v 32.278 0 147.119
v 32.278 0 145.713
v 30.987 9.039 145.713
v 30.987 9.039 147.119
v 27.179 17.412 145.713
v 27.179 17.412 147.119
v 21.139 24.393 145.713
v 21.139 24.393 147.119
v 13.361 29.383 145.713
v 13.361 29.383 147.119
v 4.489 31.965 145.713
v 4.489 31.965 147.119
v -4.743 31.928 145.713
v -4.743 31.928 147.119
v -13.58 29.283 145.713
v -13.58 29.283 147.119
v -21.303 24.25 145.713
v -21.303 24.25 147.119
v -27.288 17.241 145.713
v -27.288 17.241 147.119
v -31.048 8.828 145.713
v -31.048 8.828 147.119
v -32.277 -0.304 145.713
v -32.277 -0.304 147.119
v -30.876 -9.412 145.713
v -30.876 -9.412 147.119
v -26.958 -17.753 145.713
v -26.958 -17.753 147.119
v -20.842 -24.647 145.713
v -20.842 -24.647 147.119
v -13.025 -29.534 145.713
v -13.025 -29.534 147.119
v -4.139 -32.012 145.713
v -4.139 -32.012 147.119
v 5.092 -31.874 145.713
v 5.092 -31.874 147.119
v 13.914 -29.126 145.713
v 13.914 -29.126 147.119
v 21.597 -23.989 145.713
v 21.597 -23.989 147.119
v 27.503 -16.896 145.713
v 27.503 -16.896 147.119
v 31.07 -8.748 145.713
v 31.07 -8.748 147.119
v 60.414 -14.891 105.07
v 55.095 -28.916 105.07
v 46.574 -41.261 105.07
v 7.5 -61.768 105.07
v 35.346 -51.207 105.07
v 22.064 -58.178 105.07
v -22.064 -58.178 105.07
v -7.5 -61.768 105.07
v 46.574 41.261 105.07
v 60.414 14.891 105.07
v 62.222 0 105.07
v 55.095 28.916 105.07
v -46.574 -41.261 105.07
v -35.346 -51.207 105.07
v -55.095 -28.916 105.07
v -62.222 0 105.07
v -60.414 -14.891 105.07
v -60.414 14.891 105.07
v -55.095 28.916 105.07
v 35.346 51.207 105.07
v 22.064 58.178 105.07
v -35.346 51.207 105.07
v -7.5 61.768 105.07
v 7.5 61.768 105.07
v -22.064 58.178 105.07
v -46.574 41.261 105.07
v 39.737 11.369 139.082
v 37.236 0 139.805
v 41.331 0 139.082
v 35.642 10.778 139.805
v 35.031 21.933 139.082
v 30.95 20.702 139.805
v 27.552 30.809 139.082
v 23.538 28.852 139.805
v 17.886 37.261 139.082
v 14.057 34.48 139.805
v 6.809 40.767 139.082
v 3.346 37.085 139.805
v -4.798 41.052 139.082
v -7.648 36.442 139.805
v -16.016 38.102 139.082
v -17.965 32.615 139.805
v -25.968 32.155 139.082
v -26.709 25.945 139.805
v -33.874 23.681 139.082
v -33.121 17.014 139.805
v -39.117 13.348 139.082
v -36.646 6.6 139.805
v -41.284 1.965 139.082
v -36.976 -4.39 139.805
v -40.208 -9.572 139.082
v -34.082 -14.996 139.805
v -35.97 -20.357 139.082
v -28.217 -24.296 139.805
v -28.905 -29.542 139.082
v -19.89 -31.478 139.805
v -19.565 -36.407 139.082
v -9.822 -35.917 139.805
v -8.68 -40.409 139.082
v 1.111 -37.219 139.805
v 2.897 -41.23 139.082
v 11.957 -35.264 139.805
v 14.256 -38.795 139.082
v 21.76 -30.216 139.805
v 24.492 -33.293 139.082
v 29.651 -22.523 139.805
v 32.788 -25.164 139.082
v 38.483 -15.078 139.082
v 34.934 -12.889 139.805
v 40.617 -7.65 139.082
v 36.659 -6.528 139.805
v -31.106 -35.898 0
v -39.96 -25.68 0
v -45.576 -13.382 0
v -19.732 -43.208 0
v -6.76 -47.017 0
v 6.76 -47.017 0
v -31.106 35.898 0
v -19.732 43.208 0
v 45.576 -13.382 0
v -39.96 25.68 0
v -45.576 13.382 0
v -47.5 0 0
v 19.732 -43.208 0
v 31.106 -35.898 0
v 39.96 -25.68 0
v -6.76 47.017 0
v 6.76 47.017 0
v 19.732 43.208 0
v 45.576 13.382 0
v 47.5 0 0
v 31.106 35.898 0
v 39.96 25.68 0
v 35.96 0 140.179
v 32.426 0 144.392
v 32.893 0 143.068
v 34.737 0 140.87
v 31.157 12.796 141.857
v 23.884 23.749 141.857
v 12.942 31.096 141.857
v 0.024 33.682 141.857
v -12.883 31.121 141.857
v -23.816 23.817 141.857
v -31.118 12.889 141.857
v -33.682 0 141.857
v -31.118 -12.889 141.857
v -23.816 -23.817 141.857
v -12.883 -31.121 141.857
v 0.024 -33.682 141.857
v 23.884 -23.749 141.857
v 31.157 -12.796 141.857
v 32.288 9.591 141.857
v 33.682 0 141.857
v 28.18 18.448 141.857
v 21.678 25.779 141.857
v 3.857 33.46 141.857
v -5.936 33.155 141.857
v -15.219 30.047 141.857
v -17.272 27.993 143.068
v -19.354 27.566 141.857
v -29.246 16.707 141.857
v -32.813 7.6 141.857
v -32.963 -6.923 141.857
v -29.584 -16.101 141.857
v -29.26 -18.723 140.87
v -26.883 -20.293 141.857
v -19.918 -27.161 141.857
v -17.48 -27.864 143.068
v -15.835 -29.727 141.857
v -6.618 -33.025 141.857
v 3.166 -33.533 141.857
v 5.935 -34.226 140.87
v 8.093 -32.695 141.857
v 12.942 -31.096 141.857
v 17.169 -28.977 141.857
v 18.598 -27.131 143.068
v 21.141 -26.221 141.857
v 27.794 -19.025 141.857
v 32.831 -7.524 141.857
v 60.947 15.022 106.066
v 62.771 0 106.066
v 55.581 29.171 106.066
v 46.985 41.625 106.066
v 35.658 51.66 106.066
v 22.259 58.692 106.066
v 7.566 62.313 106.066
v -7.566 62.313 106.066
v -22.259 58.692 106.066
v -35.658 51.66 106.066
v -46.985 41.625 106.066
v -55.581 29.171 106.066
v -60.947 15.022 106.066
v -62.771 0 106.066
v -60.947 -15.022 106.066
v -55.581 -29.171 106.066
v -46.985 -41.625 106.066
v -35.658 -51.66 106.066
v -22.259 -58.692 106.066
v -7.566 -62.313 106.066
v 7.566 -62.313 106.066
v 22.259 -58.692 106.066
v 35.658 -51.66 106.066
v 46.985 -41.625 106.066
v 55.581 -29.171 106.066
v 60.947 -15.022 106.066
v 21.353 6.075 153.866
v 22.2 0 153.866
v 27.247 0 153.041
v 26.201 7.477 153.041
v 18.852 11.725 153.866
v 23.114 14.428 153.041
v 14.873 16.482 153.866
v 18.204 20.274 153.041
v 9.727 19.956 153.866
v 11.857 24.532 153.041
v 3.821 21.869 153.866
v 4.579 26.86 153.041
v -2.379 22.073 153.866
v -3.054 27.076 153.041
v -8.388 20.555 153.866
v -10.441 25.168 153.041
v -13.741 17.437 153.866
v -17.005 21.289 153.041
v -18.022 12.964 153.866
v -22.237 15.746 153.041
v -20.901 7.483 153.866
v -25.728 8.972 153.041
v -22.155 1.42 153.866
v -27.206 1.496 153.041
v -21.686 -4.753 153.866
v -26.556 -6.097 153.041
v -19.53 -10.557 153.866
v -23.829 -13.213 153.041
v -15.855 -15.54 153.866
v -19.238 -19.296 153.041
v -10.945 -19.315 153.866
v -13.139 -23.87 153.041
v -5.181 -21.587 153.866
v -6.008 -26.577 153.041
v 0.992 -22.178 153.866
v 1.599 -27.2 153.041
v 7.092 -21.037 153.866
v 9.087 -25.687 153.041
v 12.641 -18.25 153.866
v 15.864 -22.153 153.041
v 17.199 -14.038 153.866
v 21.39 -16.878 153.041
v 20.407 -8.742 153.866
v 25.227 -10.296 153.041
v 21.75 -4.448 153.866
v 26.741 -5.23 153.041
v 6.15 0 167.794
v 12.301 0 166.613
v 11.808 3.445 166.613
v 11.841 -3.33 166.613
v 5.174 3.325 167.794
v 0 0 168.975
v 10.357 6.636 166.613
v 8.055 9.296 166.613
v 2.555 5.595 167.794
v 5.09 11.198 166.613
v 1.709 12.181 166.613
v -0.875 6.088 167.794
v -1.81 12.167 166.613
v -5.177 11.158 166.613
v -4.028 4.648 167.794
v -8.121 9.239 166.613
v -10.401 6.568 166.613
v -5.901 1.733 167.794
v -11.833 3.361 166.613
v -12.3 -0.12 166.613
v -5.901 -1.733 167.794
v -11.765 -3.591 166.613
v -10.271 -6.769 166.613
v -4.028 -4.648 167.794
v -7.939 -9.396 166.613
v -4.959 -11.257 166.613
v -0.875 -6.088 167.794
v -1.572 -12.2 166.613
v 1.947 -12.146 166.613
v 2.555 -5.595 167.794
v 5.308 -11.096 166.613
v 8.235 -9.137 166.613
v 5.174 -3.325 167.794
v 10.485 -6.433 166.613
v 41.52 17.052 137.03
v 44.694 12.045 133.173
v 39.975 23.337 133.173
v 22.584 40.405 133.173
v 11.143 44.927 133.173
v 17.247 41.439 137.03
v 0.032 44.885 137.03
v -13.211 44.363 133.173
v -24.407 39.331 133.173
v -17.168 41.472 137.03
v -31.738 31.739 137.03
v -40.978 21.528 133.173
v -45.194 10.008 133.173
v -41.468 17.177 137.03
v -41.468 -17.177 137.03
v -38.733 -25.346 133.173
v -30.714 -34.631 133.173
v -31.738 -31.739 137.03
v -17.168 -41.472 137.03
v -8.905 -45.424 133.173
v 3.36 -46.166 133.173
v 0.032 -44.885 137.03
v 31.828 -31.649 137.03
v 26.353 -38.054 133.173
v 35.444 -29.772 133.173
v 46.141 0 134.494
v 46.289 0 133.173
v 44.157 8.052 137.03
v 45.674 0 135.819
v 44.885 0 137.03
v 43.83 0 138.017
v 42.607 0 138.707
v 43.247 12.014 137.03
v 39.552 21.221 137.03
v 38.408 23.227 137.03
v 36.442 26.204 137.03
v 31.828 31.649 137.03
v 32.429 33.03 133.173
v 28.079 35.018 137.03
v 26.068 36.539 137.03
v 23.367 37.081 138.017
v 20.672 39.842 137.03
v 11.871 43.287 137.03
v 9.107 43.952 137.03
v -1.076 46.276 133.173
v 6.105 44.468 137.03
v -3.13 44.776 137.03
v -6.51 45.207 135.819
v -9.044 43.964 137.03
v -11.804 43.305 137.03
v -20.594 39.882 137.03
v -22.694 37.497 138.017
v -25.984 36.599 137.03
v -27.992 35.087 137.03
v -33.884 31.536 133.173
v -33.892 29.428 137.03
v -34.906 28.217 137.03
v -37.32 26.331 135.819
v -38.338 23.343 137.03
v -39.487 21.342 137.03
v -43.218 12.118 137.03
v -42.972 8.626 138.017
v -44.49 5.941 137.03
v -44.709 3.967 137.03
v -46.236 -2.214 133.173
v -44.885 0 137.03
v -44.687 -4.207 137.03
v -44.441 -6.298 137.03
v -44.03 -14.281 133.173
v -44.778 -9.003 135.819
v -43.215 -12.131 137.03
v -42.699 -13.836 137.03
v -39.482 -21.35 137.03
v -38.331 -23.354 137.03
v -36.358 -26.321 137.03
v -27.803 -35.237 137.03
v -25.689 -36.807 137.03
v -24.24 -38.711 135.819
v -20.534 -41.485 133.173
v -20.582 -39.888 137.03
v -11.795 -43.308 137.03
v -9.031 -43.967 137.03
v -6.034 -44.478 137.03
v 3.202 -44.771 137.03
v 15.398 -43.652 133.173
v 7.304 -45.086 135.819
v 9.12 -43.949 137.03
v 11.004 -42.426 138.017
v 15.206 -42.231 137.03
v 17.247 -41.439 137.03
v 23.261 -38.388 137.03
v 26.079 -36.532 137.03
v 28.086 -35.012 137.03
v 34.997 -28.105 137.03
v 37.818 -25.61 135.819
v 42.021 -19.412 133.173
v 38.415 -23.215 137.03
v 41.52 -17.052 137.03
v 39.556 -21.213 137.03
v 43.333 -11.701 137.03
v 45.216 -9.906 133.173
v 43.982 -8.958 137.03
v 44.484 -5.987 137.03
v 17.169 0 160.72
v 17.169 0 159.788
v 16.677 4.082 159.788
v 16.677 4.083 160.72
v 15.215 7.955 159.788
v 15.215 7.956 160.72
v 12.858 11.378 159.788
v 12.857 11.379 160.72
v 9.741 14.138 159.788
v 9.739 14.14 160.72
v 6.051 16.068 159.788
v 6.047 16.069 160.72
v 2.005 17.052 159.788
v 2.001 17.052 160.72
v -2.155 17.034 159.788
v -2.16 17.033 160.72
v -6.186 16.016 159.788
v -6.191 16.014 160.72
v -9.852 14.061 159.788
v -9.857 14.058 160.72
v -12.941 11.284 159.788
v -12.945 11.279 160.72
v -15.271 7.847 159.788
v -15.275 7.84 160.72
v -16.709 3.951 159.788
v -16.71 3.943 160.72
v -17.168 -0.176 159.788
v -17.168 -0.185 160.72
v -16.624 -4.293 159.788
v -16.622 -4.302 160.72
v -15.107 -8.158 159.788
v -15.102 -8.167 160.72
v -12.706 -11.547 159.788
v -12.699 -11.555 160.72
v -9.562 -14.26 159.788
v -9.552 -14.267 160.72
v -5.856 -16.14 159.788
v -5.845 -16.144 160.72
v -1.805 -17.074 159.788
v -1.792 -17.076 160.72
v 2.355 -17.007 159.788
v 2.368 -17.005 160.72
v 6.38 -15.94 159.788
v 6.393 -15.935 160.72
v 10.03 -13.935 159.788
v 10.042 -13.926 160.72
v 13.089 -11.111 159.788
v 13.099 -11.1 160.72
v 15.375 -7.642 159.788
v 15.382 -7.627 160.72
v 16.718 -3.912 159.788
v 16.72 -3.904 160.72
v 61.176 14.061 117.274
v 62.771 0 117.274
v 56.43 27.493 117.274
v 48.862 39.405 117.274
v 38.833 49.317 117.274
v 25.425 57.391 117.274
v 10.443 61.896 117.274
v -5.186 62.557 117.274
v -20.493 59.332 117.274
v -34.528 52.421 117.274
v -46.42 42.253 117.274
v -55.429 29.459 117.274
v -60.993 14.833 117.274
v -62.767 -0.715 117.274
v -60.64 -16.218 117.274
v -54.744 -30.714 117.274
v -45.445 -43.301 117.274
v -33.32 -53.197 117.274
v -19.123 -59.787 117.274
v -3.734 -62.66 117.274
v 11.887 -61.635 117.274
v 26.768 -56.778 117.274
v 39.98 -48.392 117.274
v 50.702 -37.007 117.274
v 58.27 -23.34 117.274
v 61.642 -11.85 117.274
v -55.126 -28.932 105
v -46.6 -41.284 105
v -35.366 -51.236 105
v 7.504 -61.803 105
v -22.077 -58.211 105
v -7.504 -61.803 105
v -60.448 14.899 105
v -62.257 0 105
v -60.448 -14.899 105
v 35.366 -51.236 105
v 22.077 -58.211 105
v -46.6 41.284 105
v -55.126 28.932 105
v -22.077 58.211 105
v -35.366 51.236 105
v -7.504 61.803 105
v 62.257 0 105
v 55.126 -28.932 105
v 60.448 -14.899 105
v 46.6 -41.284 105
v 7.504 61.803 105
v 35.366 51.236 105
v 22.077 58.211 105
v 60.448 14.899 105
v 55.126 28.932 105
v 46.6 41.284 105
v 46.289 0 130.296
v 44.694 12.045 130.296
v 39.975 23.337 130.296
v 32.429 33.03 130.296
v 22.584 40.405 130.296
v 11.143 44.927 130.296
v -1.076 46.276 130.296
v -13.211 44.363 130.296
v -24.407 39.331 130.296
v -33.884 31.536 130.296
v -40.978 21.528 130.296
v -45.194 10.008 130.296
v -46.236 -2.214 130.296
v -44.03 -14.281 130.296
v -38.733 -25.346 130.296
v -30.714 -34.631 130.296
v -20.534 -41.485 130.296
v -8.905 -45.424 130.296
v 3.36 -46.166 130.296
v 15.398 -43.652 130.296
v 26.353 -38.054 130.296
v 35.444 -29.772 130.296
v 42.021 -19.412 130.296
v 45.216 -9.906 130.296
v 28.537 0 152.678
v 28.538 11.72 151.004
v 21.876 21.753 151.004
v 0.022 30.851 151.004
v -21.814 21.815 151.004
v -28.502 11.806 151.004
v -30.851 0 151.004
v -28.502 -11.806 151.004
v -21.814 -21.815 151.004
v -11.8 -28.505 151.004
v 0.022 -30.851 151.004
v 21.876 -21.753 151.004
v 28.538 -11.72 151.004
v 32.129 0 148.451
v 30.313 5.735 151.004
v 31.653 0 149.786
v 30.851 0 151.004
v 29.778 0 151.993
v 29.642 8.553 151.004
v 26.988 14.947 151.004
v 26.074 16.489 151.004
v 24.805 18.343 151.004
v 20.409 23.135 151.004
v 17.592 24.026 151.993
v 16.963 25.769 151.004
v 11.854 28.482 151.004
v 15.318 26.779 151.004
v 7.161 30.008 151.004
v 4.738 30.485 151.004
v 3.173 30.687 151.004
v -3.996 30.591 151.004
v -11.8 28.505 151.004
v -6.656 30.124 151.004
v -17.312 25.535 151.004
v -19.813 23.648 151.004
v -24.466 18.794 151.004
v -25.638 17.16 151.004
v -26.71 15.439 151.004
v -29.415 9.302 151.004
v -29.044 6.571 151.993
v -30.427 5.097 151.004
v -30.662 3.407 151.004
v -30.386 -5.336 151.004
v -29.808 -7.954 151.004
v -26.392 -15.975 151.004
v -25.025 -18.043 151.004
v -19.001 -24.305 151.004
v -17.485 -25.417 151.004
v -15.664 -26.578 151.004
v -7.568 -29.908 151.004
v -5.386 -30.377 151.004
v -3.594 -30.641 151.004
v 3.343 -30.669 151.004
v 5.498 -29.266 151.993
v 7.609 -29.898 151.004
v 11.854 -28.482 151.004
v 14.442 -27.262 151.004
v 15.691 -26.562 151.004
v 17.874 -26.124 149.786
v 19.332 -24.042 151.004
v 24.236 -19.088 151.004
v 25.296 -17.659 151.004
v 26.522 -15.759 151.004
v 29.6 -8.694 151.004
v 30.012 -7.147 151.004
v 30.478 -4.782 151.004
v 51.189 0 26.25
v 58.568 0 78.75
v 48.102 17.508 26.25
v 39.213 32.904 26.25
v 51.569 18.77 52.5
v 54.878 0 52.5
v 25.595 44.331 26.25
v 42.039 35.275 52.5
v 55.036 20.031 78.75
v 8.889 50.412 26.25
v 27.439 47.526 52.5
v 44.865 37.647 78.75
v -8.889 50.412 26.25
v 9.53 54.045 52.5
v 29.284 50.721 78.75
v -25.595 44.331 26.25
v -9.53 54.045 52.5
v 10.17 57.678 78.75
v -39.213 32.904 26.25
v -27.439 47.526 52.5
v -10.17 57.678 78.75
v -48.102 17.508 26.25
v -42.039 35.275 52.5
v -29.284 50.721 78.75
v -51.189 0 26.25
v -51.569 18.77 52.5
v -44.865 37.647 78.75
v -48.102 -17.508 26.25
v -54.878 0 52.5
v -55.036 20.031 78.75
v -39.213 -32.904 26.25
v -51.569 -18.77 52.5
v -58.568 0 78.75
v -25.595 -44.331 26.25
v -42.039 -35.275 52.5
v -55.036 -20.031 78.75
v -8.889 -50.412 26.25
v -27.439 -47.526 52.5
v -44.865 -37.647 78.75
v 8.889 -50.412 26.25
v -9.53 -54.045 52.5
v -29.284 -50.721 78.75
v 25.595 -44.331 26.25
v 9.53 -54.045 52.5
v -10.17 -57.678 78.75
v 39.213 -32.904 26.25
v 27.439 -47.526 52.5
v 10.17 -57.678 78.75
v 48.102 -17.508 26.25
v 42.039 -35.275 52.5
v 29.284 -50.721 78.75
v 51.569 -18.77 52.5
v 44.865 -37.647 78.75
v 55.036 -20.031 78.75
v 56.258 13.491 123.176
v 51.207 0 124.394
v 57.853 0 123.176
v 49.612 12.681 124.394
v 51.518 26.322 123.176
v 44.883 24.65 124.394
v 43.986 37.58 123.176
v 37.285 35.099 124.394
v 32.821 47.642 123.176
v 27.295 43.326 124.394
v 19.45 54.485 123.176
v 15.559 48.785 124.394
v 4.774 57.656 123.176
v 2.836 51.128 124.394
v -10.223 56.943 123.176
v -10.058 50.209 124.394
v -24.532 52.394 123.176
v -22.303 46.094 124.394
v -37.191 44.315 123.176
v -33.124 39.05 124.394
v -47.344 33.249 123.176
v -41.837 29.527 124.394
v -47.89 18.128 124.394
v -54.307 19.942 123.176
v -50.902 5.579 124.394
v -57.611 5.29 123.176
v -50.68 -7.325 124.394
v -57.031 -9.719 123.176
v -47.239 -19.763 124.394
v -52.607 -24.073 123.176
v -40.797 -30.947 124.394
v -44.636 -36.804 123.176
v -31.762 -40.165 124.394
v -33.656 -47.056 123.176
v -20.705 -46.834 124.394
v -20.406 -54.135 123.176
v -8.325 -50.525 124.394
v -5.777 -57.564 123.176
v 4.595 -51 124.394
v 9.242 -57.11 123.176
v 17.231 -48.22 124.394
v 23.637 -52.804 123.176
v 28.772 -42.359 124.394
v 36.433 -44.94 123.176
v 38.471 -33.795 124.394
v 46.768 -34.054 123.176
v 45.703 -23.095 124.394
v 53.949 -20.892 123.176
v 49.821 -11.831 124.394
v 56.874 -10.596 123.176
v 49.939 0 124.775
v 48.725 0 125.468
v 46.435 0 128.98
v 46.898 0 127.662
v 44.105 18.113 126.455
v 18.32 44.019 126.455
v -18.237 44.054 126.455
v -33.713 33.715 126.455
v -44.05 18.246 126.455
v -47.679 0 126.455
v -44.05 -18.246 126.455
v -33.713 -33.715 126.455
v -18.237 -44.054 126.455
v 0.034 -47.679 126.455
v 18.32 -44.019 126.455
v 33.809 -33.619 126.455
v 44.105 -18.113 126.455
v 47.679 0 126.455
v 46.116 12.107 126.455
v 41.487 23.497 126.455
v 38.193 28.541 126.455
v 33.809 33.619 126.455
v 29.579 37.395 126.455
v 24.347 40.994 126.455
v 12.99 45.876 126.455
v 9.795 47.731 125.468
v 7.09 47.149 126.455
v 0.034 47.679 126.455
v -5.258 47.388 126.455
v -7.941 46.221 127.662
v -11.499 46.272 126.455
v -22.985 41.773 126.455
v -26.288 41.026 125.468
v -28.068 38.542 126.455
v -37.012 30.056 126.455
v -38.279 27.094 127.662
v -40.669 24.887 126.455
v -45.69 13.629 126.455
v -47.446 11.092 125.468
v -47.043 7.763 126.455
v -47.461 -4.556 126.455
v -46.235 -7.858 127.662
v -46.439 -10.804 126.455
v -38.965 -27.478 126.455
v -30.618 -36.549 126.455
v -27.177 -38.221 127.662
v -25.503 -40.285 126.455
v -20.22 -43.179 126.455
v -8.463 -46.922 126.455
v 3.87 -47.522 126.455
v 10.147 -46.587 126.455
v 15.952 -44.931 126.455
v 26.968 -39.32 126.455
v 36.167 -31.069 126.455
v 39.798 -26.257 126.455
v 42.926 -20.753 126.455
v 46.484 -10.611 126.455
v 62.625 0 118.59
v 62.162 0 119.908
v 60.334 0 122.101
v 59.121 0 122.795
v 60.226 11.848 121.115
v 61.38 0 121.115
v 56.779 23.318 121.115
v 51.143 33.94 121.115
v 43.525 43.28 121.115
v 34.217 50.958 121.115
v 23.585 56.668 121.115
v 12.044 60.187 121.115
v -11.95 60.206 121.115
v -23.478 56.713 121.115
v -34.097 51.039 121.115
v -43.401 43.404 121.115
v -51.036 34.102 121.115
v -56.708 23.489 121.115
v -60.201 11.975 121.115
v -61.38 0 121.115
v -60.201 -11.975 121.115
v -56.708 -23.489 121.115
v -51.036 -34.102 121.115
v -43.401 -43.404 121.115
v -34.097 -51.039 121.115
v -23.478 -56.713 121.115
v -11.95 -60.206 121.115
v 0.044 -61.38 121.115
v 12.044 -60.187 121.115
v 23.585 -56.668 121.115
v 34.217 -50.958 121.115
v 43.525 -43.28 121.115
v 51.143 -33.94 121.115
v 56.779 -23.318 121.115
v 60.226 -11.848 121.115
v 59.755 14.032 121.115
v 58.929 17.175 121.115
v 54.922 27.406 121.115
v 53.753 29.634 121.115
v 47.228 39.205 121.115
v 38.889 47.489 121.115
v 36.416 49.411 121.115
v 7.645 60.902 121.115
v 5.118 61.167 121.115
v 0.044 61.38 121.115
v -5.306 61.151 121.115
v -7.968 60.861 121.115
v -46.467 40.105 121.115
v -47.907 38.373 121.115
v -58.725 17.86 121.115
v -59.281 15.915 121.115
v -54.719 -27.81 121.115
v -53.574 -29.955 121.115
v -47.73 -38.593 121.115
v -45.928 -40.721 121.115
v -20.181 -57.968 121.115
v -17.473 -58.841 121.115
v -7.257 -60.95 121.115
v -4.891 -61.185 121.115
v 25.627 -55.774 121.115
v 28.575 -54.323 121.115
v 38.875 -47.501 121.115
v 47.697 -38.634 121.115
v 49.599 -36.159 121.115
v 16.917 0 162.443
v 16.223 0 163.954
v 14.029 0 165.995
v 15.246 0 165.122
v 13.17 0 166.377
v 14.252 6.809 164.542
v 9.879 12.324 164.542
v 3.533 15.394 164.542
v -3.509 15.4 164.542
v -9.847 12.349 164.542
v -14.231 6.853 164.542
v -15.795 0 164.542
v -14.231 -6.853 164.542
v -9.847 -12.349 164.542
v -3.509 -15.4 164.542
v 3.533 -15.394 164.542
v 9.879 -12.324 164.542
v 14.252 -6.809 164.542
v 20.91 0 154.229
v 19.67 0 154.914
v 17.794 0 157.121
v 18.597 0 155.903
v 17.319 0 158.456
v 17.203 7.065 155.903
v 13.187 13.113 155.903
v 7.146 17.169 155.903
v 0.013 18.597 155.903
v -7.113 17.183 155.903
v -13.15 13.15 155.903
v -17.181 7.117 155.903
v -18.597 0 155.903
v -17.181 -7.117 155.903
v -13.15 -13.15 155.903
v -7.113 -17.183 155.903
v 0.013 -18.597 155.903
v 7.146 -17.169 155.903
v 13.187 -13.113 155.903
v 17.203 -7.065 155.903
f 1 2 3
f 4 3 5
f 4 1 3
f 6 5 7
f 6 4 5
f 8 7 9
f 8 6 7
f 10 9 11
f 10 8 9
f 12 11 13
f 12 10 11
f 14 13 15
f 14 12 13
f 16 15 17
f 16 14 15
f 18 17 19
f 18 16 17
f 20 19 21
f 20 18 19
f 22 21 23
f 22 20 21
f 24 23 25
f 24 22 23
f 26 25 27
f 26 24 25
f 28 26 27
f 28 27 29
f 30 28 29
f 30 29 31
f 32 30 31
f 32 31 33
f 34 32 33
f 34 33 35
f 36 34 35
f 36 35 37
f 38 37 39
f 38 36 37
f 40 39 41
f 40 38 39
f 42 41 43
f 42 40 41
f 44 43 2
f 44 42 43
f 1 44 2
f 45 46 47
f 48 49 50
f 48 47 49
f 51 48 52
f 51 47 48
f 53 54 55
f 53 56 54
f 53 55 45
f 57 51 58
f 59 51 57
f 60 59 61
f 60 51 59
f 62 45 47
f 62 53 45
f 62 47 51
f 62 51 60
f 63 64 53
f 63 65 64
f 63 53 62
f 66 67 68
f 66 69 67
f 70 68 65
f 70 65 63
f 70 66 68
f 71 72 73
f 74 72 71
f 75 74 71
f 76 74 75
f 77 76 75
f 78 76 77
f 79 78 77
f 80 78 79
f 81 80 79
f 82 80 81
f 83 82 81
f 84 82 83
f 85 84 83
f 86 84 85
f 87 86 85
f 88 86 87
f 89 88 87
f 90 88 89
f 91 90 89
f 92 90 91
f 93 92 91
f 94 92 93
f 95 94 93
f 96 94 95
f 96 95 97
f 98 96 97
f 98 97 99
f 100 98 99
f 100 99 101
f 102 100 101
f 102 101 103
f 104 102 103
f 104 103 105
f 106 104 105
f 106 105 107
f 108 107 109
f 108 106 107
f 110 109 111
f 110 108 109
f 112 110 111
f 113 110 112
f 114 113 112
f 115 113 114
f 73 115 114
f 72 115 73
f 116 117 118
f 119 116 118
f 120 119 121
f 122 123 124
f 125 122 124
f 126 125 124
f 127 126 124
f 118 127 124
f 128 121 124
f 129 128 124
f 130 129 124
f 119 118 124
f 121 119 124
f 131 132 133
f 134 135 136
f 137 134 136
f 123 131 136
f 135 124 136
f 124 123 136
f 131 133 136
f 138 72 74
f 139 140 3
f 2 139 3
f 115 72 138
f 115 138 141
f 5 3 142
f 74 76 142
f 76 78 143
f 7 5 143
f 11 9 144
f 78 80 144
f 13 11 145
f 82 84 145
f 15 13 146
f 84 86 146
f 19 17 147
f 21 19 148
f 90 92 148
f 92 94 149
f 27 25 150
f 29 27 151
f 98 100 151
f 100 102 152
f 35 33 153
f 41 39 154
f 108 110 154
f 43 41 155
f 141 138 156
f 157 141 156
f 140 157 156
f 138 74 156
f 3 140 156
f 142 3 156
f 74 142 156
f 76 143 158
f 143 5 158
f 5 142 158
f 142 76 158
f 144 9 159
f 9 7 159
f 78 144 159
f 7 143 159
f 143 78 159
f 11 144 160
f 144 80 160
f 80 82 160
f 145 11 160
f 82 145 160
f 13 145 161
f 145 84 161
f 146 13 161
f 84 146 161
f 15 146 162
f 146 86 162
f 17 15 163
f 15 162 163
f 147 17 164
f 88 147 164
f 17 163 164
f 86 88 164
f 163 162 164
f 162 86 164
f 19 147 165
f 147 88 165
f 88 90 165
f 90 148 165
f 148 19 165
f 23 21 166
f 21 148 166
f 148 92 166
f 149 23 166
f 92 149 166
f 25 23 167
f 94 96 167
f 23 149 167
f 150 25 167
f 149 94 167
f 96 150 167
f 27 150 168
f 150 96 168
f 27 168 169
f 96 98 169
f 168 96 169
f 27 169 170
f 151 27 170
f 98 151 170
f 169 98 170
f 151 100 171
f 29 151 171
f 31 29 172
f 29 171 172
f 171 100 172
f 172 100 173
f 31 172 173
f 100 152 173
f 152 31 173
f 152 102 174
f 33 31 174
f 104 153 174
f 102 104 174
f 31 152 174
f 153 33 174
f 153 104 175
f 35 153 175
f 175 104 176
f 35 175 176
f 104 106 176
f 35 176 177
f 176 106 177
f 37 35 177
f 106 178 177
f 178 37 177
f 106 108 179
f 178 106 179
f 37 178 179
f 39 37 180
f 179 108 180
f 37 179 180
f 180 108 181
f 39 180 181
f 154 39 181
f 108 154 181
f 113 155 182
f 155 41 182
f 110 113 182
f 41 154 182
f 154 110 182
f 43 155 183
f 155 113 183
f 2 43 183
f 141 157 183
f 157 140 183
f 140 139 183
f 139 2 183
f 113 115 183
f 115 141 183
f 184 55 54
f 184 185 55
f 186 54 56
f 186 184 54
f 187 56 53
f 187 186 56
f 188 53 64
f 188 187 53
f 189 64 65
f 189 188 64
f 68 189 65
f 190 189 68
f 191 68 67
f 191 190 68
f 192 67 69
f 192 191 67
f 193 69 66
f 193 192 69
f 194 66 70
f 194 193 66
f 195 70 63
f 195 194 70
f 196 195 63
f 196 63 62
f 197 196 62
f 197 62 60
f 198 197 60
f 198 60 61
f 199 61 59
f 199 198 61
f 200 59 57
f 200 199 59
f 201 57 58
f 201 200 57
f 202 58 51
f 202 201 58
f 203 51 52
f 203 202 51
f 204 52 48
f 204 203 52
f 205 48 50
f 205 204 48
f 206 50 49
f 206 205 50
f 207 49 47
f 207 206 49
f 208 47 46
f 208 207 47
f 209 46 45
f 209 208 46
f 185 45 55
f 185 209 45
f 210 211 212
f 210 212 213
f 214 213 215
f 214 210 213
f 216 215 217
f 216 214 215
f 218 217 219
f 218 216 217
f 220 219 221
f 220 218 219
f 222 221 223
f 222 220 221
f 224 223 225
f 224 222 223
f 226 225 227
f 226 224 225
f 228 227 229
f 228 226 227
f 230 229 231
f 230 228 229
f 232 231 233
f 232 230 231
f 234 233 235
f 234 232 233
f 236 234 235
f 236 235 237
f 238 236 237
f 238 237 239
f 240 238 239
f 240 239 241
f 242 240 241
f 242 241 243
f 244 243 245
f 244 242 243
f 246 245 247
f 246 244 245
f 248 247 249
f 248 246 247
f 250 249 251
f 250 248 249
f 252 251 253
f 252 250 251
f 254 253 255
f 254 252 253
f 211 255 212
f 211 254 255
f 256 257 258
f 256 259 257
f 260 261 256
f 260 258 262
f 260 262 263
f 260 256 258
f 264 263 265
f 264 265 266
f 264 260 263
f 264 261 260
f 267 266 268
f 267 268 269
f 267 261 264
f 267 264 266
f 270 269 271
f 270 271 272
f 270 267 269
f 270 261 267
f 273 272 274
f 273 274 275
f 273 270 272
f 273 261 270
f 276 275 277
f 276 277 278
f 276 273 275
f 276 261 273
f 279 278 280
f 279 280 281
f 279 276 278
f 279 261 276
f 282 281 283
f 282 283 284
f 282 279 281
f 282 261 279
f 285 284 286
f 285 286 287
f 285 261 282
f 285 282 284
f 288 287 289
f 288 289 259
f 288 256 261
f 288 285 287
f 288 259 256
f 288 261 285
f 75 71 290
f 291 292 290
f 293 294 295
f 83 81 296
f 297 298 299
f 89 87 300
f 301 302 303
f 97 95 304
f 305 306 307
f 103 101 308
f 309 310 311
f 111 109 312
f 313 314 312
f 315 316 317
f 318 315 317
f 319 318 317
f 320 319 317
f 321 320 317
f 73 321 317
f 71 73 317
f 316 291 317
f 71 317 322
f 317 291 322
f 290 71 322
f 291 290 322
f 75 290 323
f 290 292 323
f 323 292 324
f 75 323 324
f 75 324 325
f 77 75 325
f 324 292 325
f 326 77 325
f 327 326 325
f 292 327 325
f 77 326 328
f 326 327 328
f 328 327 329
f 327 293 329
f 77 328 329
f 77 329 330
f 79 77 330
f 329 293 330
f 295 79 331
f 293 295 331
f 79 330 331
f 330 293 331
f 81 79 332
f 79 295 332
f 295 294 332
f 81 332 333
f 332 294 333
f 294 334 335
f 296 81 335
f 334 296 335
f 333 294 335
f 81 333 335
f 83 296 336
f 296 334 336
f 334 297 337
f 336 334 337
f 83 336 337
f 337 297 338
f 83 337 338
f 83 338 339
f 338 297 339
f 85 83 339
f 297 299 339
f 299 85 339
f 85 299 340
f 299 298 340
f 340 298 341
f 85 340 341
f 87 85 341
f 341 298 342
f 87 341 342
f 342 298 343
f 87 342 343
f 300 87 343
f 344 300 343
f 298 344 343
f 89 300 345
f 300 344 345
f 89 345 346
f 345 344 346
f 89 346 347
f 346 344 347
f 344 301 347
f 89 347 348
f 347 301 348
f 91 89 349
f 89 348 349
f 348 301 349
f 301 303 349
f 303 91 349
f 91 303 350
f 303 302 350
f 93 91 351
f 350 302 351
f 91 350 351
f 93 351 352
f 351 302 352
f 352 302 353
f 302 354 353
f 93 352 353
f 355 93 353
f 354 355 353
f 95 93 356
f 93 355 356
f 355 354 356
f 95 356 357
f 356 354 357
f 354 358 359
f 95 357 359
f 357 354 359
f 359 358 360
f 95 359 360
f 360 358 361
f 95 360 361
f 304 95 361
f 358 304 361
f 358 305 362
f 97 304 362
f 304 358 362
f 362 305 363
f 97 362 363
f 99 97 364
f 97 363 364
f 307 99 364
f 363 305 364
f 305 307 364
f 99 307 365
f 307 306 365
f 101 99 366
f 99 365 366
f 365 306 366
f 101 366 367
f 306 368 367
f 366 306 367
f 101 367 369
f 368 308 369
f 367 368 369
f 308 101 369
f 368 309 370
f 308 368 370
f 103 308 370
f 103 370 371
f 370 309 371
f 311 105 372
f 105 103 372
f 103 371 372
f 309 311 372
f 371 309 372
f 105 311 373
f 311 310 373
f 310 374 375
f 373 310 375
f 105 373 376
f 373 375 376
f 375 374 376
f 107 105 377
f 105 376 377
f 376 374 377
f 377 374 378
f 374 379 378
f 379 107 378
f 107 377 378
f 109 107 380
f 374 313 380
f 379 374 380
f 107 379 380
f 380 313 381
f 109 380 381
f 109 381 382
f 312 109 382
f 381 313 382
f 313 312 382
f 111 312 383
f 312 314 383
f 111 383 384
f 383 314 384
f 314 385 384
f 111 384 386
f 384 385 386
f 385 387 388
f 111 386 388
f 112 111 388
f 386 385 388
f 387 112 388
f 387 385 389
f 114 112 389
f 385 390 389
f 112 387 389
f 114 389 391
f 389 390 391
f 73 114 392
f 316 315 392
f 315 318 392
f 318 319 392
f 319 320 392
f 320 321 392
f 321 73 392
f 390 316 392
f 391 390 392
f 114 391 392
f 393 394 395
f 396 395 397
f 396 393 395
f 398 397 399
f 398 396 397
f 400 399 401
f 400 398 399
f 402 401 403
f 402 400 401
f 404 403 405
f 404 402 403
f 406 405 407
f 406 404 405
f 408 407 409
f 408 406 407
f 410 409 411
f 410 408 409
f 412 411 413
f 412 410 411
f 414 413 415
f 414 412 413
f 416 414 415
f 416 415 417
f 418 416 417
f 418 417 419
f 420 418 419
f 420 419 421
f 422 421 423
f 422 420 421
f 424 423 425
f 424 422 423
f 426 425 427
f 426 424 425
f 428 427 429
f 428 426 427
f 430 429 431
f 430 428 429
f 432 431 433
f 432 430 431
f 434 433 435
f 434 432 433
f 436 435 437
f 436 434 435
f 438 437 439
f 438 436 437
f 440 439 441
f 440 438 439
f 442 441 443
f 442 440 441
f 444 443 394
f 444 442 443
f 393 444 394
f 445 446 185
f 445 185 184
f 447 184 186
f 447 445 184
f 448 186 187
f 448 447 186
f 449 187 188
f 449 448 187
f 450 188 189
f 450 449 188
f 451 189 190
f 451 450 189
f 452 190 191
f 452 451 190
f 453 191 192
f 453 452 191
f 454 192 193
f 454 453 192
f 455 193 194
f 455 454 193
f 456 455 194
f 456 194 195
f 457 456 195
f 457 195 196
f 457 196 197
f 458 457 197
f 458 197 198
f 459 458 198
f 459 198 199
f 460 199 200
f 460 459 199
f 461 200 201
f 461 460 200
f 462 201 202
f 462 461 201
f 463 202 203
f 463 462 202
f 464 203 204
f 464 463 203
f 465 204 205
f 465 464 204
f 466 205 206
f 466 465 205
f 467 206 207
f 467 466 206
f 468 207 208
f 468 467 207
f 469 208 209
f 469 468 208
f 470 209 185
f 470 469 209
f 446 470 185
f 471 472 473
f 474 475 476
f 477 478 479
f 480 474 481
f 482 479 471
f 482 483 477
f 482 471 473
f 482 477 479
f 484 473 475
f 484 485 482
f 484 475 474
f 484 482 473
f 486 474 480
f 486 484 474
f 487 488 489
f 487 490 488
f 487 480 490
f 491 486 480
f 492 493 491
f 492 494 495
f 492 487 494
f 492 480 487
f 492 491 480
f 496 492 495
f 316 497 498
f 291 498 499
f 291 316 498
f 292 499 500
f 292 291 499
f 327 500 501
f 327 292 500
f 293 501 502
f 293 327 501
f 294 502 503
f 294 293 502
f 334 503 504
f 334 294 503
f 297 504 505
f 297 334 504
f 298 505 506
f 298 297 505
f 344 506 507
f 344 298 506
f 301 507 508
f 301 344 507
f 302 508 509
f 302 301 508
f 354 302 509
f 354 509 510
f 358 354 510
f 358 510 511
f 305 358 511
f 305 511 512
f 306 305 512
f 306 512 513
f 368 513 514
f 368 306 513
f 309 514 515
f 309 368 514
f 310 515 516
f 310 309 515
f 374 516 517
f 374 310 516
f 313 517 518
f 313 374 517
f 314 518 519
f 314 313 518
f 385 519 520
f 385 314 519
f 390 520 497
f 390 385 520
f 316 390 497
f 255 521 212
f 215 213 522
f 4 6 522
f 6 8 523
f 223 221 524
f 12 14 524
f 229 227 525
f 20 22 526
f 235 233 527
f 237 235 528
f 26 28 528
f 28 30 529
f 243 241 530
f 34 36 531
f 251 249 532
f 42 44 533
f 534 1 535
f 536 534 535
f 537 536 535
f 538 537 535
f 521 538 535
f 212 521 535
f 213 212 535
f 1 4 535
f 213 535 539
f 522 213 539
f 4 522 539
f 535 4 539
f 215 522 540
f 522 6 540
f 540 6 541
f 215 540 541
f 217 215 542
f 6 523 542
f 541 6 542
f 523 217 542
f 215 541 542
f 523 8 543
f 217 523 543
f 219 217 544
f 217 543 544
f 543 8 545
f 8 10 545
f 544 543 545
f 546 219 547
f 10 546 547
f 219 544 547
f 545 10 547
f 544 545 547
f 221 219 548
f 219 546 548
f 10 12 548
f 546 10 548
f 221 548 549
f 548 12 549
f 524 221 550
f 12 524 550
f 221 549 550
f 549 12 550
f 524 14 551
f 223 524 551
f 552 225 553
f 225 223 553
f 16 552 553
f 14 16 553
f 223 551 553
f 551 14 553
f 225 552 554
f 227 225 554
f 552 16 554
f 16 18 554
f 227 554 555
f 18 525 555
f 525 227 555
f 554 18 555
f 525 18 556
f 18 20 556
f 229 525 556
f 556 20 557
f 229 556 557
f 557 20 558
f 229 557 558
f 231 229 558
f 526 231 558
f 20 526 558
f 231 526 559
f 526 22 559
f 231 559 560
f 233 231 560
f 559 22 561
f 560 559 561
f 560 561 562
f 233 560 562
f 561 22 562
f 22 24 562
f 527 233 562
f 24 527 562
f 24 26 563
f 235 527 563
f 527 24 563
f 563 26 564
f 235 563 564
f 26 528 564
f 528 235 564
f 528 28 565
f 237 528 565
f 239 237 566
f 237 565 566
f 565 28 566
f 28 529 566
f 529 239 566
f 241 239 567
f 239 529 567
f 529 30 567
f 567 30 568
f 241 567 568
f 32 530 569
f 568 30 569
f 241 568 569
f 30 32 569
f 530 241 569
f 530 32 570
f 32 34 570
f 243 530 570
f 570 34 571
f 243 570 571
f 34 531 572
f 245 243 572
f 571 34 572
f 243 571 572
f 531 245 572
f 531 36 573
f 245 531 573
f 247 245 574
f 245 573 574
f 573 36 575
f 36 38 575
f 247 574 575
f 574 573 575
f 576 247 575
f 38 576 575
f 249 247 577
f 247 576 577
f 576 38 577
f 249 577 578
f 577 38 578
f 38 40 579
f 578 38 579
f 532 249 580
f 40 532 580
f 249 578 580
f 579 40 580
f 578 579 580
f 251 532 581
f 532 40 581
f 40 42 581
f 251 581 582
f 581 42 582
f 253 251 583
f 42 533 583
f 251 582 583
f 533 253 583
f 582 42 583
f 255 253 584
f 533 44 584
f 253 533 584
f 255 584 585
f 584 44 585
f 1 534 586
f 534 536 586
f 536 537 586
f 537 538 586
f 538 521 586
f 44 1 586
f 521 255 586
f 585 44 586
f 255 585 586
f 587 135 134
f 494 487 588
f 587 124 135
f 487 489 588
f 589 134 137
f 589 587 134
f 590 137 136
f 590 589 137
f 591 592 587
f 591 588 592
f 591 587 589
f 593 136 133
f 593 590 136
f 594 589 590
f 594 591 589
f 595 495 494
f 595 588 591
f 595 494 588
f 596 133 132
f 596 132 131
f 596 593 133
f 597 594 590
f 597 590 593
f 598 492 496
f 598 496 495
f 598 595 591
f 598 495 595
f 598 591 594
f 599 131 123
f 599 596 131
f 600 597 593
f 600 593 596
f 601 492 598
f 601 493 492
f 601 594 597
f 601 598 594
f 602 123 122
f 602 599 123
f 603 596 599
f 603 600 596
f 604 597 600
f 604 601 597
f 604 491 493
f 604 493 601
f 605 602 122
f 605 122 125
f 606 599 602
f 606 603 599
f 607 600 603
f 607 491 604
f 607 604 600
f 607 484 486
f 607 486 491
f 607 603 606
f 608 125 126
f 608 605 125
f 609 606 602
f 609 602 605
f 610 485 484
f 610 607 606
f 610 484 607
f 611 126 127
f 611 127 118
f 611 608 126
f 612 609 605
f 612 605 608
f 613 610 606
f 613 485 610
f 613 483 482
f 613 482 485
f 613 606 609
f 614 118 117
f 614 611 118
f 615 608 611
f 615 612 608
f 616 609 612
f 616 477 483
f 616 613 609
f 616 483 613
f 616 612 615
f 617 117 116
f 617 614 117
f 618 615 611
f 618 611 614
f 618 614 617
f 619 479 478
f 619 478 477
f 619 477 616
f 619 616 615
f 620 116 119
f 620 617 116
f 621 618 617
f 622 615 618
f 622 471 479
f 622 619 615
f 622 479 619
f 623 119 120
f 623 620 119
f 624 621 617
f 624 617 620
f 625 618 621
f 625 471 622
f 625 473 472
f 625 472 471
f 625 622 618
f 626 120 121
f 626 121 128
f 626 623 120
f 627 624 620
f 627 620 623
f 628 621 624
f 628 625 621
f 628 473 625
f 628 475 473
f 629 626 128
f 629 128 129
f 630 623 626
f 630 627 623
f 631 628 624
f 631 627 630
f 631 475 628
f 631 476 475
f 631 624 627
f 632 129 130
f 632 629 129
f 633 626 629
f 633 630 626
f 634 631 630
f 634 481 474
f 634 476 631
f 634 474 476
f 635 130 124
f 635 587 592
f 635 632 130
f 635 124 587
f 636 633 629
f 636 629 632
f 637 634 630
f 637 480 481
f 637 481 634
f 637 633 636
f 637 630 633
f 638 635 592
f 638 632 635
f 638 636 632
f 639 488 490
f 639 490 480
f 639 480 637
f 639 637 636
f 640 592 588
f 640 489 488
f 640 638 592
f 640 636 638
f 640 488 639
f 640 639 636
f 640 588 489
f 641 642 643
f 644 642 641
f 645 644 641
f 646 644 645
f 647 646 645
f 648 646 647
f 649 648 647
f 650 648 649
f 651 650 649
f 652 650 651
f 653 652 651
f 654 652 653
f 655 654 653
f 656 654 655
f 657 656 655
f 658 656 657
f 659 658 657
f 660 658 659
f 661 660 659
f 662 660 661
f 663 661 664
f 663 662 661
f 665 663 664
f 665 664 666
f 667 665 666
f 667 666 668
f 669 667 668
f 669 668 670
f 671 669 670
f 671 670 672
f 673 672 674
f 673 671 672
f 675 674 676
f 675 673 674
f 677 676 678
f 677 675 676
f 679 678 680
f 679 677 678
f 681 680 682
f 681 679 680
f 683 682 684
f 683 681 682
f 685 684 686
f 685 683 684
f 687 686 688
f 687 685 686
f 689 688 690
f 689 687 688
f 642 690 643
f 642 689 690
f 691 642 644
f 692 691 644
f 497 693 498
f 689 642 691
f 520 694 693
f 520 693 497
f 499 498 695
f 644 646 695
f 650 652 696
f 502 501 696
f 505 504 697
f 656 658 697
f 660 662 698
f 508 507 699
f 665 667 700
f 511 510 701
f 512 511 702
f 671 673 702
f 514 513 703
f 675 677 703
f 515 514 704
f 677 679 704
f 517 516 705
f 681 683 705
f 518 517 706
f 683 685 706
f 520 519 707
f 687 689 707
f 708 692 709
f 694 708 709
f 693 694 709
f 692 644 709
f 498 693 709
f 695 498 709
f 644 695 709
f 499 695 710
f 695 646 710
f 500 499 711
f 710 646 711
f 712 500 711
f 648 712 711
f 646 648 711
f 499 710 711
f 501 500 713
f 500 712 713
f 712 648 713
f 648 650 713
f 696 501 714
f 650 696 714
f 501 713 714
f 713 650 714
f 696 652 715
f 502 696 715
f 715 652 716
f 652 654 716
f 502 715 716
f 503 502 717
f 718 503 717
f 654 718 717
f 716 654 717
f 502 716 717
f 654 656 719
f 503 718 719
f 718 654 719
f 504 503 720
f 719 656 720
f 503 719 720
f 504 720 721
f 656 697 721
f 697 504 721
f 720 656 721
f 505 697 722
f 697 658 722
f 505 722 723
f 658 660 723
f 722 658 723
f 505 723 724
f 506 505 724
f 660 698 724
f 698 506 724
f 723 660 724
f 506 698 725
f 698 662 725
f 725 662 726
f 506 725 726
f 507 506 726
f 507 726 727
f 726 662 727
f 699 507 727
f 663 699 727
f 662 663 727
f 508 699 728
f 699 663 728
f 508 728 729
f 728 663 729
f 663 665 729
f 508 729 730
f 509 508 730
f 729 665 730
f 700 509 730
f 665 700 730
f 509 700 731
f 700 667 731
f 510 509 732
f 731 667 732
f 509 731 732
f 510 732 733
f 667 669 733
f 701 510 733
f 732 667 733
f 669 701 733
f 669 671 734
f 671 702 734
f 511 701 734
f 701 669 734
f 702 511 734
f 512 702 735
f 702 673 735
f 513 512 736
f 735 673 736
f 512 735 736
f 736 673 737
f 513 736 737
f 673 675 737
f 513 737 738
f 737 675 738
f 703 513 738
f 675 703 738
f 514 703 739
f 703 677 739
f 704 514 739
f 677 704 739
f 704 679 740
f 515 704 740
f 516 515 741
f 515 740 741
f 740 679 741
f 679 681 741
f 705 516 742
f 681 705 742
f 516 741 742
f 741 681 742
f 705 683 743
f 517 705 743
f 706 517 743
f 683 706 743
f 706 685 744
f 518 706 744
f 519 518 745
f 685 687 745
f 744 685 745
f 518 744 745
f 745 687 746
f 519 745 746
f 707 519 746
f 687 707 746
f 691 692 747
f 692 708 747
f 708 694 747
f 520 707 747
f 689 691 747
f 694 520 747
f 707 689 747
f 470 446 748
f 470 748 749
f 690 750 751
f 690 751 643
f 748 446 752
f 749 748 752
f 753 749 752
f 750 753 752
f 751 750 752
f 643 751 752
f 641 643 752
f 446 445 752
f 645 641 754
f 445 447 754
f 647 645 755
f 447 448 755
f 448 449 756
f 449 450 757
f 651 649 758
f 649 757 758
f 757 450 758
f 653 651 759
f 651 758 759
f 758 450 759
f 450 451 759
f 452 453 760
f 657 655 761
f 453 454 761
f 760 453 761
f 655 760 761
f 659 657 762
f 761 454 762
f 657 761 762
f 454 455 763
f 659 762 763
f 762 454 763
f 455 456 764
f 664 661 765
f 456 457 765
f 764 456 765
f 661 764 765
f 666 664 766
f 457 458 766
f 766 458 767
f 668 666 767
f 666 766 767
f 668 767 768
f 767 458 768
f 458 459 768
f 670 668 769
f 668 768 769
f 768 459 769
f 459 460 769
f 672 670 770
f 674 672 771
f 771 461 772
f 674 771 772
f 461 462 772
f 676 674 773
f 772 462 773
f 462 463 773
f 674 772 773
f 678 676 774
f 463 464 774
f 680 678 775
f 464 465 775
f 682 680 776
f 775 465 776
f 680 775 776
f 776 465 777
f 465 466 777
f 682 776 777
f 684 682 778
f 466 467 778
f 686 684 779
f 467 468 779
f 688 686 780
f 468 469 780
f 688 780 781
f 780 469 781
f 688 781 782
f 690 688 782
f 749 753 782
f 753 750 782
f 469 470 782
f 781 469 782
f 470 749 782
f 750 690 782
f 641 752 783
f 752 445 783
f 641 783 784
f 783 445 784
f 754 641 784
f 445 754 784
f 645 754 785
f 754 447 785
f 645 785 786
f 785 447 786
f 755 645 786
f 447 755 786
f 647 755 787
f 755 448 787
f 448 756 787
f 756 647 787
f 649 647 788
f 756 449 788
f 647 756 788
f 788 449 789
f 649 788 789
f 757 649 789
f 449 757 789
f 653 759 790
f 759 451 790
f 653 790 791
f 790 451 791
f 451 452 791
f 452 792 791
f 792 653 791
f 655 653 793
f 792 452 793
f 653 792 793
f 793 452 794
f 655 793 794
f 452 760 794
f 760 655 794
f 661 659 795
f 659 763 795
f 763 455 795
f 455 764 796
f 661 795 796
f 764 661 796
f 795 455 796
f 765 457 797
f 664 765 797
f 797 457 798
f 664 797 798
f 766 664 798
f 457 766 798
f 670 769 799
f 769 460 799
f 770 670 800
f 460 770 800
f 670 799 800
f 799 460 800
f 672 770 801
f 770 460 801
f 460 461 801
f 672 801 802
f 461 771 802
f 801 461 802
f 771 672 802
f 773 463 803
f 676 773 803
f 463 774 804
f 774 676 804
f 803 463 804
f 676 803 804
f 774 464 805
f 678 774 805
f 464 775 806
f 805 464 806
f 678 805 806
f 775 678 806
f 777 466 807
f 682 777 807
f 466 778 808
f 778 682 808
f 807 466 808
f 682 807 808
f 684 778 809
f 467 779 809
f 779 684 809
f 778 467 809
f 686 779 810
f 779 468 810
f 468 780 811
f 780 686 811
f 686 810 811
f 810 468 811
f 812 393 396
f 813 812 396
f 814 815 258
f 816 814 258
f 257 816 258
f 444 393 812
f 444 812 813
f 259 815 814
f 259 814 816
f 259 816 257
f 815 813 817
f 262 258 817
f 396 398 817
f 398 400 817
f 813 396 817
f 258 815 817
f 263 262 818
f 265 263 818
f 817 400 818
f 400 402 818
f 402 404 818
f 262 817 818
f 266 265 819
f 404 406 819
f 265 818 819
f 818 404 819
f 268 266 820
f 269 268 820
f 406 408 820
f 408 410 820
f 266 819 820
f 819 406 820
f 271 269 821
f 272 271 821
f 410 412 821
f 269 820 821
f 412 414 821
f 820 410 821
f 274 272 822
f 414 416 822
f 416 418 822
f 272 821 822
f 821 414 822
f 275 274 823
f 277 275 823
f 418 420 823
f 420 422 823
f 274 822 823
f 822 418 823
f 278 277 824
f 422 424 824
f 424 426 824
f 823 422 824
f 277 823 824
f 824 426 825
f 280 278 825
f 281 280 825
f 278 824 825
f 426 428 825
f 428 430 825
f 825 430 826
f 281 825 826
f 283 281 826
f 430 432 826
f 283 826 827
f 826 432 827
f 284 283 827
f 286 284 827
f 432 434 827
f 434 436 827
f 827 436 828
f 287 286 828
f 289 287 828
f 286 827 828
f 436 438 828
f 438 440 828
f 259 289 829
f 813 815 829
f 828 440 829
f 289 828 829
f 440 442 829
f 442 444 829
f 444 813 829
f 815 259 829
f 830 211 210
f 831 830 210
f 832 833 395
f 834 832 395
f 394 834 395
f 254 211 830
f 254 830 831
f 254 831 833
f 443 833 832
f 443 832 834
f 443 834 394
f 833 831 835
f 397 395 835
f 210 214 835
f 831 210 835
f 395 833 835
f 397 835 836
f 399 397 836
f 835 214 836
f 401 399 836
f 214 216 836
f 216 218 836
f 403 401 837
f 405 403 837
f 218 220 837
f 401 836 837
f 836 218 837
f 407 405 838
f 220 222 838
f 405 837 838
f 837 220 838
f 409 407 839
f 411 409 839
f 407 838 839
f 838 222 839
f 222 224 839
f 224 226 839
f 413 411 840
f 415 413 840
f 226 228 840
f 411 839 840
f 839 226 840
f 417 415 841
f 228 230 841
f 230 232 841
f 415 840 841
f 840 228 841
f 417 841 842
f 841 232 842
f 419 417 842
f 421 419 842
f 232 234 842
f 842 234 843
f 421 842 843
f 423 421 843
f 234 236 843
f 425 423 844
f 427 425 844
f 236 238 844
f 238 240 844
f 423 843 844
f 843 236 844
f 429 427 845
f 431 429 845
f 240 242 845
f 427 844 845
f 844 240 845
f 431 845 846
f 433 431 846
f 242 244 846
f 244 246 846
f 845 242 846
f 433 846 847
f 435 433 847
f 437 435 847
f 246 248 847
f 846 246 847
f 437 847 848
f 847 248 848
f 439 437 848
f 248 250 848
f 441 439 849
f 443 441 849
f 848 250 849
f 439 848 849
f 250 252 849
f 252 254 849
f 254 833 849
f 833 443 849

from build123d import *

# Parameters (mm, degrees)
F0_R     = 47.5
F1_DEPTH = 105
F1_TAPER = -8
F4_R     = 6


with BuildPart() as f1:
    # F0 (on Top) → F1 (new body)
    with BuildSketch(Plane.XY):
        Circle(F0_R)
    extrude(amount=F1_DEPTH, taper=F1_TAPER)


with BuildPart() as f3:
    # F2 (on Front) → F3 (revolve)
    with BuildSketch(Plane.XZ):
        Polygon((0, 168.9745634794), (0, 105.0703153014), (62.2216574848, 105.0703153014), (62.7710819244, 106.0661301017), (62.7710819244, 122.2739815712), (46.2885163724, 125.2957880497), (46.2885163724, 138.2071226835), (32.2783440351, 140.6795084476), (32.2783440351, 152.2172987461), (17.1693339944, 154.6896696091), (17.1693339944, 165.6780540943), align=None)
    revolve(axis=Axis((0, 0, 121.7245608568), (0, 0, 1)))

    # F4
    f4_edges = [f3.edges().sort_by_distance(p)[0] for p in [
        (-17.169334, 0, 154.68967),
        (-32.278344, 0, 152.217299),
        (-32.278344, 0, 140.679508),
        (-46.288516, 0, 138.207123),
        (-46.288516, 0, 125.295788),
        (-62.771082, 0, 122.273982),
        (-17.169334, 0, 165.678054),
    ]]
    fillet(f4_edges, radius=F4_R)


solid = Compound([f1.part, f3.part])
